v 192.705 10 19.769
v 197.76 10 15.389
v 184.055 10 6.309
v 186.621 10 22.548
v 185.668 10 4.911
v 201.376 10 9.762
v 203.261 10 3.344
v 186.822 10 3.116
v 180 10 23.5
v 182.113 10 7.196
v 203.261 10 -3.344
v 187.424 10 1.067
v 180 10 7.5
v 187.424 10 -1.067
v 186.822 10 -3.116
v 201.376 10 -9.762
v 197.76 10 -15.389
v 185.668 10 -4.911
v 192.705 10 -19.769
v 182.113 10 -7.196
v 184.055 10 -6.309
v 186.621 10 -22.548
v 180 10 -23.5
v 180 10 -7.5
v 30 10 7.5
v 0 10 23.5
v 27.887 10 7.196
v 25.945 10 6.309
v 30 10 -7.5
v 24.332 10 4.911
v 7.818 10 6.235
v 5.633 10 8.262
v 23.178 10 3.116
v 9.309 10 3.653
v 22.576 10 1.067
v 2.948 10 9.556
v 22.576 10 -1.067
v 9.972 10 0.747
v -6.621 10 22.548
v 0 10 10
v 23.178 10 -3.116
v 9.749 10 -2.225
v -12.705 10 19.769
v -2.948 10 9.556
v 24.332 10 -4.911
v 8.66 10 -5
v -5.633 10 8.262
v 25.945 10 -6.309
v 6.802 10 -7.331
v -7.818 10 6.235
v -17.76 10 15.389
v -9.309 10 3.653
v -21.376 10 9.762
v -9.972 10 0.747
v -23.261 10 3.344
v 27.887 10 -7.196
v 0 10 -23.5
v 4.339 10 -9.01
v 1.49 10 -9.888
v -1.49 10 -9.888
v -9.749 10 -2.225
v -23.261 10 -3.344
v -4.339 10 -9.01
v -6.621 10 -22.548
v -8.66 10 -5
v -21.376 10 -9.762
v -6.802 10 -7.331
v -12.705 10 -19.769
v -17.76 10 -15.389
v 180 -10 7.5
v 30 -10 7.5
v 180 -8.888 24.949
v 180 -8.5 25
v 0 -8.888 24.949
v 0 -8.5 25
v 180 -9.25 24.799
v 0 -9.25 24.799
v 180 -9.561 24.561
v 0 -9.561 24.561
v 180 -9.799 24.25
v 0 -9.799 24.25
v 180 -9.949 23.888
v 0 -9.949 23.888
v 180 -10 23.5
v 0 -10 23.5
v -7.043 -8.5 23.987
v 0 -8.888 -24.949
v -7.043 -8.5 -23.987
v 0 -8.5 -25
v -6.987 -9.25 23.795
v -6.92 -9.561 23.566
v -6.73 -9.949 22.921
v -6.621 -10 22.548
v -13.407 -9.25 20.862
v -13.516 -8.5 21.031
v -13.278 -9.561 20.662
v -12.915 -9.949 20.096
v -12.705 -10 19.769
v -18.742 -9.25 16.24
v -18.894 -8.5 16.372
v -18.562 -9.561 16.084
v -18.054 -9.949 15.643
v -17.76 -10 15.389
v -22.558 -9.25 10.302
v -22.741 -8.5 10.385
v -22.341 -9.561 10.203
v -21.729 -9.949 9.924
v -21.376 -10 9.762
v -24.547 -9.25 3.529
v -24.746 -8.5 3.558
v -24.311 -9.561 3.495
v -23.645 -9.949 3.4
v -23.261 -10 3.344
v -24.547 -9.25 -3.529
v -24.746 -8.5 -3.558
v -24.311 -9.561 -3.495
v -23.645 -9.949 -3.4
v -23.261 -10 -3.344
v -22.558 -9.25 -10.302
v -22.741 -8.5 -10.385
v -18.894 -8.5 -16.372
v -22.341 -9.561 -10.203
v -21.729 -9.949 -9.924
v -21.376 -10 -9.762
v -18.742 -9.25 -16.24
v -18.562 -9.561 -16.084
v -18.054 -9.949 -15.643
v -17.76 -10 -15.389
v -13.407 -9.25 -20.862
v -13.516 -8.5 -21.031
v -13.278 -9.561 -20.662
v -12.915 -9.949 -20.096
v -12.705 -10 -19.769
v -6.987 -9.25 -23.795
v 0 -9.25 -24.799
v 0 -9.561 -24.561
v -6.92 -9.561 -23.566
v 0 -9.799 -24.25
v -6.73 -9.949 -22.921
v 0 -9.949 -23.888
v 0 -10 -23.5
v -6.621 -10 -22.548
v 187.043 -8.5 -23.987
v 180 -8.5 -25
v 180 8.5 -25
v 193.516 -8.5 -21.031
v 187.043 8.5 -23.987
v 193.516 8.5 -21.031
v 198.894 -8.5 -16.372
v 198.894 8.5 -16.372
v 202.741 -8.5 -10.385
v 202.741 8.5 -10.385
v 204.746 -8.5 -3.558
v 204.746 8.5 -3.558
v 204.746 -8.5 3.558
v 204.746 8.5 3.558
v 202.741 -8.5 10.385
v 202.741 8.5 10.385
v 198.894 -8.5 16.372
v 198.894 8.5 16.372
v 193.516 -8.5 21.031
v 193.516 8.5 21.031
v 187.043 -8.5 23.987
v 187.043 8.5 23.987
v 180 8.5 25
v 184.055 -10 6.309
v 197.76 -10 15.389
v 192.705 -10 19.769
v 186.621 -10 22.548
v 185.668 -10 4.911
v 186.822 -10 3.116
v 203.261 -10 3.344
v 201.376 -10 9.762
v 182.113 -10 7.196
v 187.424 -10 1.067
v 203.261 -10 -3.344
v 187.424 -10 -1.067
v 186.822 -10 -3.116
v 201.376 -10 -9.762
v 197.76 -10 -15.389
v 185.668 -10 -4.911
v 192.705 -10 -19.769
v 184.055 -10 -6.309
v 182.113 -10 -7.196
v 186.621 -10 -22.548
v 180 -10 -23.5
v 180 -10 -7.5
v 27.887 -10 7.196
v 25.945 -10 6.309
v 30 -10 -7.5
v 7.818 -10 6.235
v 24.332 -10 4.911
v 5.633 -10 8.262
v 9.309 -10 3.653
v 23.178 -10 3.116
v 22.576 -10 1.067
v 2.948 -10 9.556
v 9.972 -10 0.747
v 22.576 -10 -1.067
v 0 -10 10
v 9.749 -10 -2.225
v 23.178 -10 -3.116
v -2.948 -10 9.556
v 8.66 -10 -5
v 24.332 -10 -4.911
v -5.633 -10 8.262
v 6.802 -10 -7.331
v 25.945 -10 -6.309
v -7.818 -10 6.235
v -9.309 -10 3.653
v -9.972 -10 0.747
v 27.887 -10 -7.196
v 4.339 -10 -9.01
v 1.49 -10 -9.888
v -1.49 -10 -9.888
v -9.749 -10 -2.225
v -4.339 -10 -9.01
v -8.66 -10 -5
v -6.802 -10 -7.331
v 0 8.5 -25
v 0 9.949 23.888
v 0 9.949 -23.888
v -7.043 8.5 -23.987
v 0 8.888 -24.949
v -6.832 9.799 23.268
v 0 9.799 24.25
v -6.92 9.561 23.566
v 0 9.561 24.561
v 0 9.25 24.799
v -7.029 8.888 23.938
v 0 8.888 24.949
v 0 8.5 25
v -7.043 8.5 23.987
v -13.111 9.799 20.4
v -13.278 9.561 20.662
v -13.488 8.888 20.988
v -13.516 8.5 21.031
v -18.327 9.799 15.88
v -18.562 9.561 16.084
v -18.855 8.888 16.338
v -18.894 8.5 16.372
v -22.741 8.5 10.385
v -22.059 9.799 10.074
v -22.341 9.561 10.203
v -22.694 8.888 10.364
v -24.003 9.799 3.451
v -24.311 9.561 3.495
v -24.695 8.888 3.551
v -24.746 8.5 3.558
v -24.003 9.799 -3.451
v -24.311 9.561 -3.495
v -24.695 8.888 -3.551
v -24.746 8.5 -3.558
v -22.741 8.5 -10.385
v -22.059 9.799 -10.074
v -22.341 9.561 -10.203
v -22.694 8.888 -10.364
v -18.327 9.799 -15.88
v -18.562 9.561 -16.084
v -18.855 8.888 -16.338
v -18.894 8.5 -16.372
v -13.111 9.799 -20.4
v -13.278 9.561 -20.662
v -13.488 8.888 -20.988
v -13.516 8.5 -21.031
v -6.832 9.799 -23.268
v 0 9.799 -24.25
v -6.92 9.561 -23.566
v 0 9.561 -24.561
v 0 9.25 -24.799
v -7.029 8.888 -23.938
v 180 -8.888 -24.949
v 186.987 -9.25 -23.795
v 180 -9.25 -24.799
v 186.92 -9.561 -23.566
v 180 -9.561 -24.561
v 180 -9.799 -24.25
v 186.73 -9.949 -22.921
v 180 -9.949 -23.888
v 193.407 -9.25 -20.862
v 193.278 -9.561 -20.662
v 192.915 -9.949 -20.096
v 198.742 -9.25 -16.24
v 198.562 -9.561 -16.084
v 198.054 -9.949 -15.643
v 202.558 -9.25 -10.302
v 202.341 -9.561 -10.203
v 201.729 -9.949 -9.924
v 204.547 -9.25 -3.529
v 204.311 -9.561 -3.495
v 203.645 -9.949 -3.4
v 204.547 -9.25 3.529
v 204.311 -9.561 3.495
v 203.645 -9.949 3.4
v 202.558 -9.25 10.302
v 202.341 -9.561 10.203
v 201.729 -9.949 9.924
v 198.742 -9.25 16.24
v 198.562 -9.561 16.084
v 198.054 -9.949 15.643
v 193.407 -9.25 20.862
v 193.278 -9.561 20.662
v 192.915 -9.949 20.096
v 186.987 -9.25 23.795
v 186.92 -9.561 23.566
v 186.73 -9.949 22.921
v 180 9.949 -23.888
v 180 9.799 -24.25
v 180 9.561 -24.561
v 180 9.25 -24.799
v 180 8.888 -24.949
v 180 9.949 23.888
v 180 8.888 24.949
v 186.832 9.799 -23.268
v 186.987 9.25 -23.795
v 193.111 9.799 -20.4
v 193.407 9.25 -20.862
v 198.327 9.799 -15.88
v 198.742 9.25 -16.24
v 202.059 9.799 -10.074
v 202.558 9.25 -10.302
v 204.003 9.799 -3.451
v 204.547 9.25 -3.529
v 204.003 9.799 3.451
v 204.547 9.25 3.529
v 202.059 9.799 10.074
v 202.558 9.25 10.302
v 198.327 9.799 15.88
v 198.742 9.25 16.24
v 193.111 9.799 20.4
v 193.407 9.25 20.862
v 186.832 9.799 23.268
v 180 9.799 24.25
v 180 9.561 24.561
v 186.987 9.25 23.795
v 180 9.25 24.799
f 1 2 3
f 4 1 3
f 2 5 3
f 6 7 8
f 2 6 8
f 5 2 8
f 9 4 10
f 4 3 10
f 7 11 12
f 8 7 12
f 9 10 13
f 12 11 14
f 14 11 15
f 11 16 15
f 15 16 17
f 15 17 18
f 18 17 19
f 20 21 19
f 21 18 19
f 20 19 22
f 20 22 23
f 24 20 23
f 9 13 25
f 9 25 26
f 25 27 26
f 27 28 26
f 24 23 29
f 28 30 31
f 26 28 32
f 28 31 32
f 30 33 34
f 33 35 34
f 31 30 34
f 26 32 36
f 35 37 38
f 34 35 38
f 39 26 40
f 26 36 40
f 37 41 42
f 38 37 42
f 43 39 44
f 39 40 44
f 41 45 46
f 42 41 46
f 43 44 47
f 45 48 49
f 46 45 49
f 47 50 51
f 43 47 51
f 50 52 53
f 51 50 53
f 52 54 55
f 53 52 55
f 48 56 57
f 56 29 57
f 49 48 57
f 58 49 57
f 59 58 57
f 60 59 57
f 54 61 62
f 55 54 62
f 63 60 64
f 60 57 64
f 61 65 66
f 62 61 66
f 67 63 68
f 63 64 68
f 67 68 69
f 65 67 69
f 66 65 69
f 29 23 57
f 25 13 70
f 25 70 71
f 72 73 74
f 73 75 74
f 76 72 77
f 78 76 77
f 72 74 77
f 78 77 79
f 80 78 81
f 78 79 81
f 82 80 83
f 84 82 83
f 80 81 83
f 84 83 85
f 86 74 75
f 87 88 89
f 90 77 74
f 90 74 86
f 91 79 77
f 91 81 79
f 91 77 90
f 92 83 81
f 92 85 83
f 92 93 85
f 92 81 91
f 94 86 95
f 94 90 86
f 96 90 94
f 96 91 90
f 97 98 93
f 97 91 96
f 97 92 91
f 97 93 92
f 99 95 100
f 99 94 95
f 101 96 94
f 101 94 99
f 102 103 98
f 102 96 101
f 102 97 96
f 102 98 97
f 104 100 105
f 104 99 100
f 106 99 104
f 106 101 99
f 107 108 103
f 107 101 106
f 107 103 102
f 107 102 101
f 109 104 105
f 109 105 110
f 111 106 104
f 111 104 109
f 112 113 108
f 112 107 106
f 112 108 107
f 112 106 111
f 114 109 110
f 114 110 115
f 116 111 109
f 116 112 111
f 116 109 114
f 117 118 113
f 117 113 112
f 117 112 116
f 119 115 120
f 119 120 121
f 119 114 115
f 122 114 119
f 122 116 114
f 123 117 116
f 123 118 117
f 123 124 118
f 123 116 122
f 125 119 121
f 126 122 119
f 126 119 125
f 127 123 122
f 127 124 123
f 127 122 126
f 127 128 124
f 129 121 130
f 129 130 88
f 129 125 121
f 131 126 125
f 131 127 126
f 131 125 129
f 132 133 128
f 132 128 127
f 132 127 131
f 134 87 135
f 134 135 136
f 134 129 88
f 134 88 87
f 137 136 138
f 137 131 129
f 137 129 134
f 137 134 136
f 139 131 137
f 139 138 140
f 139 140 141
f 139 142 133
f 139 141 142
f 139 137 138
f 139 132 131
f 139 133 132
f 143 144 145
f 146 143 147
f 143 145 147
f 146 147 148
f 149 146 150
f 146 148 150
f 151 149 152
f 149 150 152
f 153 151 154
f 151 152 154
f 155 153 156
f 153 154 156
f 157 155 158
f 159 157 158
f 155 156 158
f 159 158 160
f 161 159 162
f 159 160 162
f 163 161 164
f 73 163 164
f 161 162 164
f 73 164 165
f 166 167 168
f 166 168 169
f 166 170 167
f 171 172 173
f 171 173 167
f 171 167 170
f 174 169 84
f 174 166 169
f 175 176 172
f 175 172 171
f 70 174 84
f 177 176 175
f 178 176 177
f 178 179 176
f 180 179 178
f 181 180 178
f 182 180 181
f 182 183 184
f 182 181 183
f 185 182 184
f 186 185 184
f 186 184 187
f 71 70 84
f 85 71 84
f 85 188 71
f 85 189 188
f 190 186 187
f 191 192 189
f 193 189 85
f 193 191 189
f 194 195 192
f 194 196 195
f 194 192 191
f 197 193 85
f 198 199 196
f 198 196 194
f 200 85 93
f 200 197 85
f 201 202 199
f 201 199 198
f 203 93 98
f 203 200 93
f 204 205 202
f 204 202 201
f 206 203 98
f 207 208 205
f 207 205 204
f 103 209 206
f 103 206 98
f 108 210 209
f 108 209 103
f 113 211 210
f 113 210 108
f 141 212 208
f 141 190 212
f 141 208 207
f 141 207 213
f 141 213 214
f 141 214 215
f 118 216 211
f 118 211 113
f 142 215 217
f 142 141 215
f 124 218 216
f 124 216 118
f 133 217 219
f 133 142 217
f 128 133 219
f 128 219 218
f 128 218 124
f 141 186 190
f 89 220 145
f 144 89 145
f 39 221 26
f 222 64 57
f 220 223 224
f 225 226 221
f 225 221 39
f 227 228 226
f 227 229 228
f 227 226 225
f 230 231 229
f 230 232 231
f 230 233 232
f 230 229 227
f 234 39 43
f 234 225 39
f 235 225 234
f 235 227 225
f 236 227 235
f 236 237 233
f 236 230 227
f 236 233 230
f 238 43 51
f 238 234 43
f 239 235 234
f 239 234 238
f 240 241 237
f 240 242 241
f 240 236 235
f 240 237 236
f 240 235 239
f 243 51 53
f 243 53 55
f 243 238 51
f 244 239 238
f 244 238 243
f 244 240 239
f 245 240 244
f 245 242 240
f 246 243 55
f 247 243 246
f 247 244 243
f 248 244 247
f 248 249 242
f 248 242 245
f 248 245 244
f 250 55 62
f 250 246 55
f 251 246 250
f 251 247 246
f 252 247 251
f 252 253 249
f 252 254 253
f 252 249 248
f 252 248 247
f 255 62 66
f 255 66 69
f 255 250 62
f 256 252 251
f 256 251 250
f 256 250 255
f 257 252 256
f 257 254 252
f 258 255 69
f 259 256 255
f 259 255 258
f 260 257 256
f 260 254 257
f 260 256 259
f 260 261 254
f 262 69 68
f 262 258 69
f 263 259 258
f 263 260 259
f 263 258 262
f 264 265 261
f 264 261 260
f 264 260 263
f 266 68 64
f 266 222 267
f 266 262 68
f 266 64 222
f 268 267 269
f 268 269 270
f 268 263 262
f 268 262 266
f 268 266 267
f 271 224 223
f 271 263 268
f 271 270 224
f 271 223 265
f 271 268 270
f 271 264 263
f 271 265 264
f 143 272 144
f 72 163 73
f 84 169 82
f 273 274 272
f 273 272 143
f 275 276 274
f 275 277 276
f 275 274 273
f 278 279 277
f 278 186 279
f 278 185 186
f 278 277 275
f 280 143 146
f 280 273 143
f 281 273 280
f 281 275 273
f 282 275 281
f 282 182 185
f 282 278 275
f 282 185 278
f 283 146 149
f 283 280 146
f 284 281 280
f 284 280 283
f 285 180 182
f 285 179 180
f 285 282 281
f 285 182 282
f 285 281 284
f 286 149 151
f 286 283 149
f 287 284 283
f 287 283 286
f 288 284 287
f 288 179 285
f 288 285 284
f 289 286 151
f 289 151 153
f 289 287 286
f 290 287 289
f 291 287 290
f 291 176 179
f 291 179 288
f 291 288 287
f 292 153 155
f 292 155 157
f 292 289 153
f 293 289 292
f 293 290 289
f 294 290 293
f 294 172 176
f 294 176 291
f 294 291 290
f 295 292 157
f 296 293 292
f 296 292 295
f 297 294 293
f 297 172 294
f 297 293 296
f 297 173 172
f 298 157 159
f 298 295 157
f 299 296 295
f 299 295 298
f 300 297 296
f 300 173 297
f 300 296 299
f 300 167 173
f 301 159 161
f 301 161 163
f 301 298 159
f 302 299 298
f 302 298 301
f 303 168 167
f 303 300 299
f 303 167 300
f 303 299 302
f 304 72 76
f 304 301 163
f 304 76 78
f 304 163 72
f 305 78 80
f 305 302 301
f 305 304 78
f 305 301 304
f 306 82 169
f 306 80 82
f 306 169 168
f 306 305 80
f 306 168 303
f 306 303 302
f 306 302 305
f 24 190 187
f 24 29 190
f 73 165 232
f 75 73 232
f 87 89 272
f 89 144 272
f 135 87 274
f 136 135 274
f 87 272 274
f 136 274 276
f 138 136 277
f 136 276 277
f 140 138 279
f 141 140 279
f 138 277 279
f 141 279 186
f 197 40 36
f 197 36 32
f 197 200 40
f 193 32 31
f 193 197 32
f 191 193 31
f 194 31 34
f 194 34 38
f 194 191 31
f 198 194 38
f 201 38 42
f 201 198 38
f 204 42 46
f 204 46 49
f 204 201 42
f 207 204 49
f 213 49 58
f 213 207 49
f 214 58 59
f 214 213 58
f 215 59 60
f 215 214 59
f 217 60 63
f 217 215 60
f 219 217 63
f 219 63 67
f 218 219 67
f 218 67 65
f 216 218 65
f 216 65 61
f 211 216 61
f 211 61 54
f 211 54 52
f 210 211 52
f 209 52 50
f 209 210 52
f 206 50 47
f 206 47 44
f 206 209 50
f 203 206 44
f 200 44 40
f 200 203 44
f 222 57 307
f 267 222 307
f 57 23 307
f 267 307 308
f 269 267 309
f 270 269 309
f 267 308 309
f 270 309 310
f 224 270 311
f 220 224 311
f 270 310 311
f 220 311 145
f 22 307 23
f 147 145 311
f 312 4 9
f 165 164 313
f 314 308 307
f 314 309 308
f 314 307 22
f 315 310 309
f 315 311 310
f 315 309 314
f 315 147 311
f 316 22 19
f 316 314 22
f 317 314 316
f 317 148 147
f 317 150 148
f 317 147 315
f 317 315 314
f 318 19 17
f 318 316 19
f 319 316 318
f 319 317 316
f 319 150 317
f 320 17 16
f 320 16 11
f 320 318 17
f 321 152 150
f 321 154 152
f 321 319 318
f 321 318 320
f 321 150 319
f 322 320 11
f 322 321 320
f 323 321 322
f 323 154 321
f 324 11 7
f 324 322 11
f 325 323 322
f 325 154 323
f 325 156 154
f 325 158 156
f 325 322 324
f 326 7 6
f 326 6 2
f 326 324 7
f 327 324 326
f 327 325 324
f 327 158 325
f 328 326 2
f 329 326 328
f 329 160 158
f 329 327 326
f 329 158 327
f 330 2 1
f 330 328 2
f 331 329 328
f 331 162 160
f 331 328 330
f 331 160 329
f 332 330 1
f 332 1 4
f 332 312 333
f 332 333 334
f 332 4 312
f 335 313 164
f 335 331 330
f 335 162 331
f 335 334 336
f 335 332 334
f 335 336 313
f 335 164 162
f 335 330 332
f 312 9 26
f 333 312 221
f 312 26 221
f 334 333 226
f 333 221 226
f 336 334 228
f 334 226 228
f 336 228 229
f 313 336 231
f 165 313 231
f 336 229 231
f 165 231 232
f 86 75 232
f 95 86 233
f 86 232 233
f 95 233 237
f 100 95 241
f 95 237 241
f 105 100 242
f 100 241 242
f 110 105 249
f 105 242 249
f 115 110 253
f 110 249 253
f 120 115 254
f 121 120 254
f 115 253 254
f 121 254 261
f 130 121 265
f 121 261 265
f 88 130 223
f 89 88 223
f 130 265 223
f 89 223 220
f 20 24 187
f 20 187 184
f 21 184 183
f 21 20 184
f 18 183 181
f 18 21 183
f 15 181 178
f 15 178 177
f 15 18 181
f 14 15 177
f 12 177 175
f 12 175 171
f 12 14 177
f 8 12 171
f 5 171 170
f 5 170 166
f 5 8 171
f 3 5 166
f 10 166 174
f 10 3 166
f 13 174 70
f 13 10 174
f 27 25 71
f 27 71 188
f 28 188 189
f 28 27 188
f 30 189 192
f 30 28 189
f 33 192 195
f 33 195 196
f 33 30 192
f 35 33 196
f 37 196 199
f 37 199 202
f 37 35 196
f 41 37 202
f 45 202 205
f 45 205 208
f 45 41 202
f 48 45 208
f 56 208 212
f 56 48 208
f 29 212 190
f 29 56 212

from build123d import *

# Parameters (mm, degrees)
SKETCH1_R           = 10
BOSS_EXTRUDE1_DEPTH = 10
FILLET1_R           = 1.5


with BuildPart() as part:
    # Sketch1 → Boss-Extrude1 (new, symmetric)
    with BuildSketch(Plane(origin=(0, 0, 0), x_dir=(1, 0, 0), z_dir=(0, 1, 0))):
        with BuildLine():
            Line((0, 25), (180, 25))
            ThreePointArc((180, 25), (205, 0), (180, -25))
            Line((180, -25), (0, -25))
            ThreePointArc((0, -25), (-25, 0), (0, 25))
        make_face()
        with Locations(Location((0, 0, 0), (0, 0, 270))):
            Circle(SKETCH1_R, mode=Mode.SUBTRACT)
        with BuildLine():
            Line((30, 7.5), (180, 7.5))
            ThreePointArc((180, 7.5), (187.5, 0), (180, -7.5))
            Line((180, -7.5), (30, -7.5))
            ThreePointArc((30, -7.5), (22.5, 0), (30, 7.5))
        make_face(mode=Mode.SUBTRACT)
    extrude(amount=BOSS_EXTRUDE1_DEPTH, both=True)

    # Fillet1
    fillet1_edges = [part.edges().sort_by_distance(p)[0] for p in [
        (205, 10, 0),
        (90, 10, -25),
        (-25, 10, 0),
        (90, -10, -25),
        (205, -10, 0),
        (90, -10, 25),
        (-25, -10, 0),
        (90, 10, 25),
    ]]
    fillet(fillet1_edges, radius=FILLET1_R)


solid = part.part
